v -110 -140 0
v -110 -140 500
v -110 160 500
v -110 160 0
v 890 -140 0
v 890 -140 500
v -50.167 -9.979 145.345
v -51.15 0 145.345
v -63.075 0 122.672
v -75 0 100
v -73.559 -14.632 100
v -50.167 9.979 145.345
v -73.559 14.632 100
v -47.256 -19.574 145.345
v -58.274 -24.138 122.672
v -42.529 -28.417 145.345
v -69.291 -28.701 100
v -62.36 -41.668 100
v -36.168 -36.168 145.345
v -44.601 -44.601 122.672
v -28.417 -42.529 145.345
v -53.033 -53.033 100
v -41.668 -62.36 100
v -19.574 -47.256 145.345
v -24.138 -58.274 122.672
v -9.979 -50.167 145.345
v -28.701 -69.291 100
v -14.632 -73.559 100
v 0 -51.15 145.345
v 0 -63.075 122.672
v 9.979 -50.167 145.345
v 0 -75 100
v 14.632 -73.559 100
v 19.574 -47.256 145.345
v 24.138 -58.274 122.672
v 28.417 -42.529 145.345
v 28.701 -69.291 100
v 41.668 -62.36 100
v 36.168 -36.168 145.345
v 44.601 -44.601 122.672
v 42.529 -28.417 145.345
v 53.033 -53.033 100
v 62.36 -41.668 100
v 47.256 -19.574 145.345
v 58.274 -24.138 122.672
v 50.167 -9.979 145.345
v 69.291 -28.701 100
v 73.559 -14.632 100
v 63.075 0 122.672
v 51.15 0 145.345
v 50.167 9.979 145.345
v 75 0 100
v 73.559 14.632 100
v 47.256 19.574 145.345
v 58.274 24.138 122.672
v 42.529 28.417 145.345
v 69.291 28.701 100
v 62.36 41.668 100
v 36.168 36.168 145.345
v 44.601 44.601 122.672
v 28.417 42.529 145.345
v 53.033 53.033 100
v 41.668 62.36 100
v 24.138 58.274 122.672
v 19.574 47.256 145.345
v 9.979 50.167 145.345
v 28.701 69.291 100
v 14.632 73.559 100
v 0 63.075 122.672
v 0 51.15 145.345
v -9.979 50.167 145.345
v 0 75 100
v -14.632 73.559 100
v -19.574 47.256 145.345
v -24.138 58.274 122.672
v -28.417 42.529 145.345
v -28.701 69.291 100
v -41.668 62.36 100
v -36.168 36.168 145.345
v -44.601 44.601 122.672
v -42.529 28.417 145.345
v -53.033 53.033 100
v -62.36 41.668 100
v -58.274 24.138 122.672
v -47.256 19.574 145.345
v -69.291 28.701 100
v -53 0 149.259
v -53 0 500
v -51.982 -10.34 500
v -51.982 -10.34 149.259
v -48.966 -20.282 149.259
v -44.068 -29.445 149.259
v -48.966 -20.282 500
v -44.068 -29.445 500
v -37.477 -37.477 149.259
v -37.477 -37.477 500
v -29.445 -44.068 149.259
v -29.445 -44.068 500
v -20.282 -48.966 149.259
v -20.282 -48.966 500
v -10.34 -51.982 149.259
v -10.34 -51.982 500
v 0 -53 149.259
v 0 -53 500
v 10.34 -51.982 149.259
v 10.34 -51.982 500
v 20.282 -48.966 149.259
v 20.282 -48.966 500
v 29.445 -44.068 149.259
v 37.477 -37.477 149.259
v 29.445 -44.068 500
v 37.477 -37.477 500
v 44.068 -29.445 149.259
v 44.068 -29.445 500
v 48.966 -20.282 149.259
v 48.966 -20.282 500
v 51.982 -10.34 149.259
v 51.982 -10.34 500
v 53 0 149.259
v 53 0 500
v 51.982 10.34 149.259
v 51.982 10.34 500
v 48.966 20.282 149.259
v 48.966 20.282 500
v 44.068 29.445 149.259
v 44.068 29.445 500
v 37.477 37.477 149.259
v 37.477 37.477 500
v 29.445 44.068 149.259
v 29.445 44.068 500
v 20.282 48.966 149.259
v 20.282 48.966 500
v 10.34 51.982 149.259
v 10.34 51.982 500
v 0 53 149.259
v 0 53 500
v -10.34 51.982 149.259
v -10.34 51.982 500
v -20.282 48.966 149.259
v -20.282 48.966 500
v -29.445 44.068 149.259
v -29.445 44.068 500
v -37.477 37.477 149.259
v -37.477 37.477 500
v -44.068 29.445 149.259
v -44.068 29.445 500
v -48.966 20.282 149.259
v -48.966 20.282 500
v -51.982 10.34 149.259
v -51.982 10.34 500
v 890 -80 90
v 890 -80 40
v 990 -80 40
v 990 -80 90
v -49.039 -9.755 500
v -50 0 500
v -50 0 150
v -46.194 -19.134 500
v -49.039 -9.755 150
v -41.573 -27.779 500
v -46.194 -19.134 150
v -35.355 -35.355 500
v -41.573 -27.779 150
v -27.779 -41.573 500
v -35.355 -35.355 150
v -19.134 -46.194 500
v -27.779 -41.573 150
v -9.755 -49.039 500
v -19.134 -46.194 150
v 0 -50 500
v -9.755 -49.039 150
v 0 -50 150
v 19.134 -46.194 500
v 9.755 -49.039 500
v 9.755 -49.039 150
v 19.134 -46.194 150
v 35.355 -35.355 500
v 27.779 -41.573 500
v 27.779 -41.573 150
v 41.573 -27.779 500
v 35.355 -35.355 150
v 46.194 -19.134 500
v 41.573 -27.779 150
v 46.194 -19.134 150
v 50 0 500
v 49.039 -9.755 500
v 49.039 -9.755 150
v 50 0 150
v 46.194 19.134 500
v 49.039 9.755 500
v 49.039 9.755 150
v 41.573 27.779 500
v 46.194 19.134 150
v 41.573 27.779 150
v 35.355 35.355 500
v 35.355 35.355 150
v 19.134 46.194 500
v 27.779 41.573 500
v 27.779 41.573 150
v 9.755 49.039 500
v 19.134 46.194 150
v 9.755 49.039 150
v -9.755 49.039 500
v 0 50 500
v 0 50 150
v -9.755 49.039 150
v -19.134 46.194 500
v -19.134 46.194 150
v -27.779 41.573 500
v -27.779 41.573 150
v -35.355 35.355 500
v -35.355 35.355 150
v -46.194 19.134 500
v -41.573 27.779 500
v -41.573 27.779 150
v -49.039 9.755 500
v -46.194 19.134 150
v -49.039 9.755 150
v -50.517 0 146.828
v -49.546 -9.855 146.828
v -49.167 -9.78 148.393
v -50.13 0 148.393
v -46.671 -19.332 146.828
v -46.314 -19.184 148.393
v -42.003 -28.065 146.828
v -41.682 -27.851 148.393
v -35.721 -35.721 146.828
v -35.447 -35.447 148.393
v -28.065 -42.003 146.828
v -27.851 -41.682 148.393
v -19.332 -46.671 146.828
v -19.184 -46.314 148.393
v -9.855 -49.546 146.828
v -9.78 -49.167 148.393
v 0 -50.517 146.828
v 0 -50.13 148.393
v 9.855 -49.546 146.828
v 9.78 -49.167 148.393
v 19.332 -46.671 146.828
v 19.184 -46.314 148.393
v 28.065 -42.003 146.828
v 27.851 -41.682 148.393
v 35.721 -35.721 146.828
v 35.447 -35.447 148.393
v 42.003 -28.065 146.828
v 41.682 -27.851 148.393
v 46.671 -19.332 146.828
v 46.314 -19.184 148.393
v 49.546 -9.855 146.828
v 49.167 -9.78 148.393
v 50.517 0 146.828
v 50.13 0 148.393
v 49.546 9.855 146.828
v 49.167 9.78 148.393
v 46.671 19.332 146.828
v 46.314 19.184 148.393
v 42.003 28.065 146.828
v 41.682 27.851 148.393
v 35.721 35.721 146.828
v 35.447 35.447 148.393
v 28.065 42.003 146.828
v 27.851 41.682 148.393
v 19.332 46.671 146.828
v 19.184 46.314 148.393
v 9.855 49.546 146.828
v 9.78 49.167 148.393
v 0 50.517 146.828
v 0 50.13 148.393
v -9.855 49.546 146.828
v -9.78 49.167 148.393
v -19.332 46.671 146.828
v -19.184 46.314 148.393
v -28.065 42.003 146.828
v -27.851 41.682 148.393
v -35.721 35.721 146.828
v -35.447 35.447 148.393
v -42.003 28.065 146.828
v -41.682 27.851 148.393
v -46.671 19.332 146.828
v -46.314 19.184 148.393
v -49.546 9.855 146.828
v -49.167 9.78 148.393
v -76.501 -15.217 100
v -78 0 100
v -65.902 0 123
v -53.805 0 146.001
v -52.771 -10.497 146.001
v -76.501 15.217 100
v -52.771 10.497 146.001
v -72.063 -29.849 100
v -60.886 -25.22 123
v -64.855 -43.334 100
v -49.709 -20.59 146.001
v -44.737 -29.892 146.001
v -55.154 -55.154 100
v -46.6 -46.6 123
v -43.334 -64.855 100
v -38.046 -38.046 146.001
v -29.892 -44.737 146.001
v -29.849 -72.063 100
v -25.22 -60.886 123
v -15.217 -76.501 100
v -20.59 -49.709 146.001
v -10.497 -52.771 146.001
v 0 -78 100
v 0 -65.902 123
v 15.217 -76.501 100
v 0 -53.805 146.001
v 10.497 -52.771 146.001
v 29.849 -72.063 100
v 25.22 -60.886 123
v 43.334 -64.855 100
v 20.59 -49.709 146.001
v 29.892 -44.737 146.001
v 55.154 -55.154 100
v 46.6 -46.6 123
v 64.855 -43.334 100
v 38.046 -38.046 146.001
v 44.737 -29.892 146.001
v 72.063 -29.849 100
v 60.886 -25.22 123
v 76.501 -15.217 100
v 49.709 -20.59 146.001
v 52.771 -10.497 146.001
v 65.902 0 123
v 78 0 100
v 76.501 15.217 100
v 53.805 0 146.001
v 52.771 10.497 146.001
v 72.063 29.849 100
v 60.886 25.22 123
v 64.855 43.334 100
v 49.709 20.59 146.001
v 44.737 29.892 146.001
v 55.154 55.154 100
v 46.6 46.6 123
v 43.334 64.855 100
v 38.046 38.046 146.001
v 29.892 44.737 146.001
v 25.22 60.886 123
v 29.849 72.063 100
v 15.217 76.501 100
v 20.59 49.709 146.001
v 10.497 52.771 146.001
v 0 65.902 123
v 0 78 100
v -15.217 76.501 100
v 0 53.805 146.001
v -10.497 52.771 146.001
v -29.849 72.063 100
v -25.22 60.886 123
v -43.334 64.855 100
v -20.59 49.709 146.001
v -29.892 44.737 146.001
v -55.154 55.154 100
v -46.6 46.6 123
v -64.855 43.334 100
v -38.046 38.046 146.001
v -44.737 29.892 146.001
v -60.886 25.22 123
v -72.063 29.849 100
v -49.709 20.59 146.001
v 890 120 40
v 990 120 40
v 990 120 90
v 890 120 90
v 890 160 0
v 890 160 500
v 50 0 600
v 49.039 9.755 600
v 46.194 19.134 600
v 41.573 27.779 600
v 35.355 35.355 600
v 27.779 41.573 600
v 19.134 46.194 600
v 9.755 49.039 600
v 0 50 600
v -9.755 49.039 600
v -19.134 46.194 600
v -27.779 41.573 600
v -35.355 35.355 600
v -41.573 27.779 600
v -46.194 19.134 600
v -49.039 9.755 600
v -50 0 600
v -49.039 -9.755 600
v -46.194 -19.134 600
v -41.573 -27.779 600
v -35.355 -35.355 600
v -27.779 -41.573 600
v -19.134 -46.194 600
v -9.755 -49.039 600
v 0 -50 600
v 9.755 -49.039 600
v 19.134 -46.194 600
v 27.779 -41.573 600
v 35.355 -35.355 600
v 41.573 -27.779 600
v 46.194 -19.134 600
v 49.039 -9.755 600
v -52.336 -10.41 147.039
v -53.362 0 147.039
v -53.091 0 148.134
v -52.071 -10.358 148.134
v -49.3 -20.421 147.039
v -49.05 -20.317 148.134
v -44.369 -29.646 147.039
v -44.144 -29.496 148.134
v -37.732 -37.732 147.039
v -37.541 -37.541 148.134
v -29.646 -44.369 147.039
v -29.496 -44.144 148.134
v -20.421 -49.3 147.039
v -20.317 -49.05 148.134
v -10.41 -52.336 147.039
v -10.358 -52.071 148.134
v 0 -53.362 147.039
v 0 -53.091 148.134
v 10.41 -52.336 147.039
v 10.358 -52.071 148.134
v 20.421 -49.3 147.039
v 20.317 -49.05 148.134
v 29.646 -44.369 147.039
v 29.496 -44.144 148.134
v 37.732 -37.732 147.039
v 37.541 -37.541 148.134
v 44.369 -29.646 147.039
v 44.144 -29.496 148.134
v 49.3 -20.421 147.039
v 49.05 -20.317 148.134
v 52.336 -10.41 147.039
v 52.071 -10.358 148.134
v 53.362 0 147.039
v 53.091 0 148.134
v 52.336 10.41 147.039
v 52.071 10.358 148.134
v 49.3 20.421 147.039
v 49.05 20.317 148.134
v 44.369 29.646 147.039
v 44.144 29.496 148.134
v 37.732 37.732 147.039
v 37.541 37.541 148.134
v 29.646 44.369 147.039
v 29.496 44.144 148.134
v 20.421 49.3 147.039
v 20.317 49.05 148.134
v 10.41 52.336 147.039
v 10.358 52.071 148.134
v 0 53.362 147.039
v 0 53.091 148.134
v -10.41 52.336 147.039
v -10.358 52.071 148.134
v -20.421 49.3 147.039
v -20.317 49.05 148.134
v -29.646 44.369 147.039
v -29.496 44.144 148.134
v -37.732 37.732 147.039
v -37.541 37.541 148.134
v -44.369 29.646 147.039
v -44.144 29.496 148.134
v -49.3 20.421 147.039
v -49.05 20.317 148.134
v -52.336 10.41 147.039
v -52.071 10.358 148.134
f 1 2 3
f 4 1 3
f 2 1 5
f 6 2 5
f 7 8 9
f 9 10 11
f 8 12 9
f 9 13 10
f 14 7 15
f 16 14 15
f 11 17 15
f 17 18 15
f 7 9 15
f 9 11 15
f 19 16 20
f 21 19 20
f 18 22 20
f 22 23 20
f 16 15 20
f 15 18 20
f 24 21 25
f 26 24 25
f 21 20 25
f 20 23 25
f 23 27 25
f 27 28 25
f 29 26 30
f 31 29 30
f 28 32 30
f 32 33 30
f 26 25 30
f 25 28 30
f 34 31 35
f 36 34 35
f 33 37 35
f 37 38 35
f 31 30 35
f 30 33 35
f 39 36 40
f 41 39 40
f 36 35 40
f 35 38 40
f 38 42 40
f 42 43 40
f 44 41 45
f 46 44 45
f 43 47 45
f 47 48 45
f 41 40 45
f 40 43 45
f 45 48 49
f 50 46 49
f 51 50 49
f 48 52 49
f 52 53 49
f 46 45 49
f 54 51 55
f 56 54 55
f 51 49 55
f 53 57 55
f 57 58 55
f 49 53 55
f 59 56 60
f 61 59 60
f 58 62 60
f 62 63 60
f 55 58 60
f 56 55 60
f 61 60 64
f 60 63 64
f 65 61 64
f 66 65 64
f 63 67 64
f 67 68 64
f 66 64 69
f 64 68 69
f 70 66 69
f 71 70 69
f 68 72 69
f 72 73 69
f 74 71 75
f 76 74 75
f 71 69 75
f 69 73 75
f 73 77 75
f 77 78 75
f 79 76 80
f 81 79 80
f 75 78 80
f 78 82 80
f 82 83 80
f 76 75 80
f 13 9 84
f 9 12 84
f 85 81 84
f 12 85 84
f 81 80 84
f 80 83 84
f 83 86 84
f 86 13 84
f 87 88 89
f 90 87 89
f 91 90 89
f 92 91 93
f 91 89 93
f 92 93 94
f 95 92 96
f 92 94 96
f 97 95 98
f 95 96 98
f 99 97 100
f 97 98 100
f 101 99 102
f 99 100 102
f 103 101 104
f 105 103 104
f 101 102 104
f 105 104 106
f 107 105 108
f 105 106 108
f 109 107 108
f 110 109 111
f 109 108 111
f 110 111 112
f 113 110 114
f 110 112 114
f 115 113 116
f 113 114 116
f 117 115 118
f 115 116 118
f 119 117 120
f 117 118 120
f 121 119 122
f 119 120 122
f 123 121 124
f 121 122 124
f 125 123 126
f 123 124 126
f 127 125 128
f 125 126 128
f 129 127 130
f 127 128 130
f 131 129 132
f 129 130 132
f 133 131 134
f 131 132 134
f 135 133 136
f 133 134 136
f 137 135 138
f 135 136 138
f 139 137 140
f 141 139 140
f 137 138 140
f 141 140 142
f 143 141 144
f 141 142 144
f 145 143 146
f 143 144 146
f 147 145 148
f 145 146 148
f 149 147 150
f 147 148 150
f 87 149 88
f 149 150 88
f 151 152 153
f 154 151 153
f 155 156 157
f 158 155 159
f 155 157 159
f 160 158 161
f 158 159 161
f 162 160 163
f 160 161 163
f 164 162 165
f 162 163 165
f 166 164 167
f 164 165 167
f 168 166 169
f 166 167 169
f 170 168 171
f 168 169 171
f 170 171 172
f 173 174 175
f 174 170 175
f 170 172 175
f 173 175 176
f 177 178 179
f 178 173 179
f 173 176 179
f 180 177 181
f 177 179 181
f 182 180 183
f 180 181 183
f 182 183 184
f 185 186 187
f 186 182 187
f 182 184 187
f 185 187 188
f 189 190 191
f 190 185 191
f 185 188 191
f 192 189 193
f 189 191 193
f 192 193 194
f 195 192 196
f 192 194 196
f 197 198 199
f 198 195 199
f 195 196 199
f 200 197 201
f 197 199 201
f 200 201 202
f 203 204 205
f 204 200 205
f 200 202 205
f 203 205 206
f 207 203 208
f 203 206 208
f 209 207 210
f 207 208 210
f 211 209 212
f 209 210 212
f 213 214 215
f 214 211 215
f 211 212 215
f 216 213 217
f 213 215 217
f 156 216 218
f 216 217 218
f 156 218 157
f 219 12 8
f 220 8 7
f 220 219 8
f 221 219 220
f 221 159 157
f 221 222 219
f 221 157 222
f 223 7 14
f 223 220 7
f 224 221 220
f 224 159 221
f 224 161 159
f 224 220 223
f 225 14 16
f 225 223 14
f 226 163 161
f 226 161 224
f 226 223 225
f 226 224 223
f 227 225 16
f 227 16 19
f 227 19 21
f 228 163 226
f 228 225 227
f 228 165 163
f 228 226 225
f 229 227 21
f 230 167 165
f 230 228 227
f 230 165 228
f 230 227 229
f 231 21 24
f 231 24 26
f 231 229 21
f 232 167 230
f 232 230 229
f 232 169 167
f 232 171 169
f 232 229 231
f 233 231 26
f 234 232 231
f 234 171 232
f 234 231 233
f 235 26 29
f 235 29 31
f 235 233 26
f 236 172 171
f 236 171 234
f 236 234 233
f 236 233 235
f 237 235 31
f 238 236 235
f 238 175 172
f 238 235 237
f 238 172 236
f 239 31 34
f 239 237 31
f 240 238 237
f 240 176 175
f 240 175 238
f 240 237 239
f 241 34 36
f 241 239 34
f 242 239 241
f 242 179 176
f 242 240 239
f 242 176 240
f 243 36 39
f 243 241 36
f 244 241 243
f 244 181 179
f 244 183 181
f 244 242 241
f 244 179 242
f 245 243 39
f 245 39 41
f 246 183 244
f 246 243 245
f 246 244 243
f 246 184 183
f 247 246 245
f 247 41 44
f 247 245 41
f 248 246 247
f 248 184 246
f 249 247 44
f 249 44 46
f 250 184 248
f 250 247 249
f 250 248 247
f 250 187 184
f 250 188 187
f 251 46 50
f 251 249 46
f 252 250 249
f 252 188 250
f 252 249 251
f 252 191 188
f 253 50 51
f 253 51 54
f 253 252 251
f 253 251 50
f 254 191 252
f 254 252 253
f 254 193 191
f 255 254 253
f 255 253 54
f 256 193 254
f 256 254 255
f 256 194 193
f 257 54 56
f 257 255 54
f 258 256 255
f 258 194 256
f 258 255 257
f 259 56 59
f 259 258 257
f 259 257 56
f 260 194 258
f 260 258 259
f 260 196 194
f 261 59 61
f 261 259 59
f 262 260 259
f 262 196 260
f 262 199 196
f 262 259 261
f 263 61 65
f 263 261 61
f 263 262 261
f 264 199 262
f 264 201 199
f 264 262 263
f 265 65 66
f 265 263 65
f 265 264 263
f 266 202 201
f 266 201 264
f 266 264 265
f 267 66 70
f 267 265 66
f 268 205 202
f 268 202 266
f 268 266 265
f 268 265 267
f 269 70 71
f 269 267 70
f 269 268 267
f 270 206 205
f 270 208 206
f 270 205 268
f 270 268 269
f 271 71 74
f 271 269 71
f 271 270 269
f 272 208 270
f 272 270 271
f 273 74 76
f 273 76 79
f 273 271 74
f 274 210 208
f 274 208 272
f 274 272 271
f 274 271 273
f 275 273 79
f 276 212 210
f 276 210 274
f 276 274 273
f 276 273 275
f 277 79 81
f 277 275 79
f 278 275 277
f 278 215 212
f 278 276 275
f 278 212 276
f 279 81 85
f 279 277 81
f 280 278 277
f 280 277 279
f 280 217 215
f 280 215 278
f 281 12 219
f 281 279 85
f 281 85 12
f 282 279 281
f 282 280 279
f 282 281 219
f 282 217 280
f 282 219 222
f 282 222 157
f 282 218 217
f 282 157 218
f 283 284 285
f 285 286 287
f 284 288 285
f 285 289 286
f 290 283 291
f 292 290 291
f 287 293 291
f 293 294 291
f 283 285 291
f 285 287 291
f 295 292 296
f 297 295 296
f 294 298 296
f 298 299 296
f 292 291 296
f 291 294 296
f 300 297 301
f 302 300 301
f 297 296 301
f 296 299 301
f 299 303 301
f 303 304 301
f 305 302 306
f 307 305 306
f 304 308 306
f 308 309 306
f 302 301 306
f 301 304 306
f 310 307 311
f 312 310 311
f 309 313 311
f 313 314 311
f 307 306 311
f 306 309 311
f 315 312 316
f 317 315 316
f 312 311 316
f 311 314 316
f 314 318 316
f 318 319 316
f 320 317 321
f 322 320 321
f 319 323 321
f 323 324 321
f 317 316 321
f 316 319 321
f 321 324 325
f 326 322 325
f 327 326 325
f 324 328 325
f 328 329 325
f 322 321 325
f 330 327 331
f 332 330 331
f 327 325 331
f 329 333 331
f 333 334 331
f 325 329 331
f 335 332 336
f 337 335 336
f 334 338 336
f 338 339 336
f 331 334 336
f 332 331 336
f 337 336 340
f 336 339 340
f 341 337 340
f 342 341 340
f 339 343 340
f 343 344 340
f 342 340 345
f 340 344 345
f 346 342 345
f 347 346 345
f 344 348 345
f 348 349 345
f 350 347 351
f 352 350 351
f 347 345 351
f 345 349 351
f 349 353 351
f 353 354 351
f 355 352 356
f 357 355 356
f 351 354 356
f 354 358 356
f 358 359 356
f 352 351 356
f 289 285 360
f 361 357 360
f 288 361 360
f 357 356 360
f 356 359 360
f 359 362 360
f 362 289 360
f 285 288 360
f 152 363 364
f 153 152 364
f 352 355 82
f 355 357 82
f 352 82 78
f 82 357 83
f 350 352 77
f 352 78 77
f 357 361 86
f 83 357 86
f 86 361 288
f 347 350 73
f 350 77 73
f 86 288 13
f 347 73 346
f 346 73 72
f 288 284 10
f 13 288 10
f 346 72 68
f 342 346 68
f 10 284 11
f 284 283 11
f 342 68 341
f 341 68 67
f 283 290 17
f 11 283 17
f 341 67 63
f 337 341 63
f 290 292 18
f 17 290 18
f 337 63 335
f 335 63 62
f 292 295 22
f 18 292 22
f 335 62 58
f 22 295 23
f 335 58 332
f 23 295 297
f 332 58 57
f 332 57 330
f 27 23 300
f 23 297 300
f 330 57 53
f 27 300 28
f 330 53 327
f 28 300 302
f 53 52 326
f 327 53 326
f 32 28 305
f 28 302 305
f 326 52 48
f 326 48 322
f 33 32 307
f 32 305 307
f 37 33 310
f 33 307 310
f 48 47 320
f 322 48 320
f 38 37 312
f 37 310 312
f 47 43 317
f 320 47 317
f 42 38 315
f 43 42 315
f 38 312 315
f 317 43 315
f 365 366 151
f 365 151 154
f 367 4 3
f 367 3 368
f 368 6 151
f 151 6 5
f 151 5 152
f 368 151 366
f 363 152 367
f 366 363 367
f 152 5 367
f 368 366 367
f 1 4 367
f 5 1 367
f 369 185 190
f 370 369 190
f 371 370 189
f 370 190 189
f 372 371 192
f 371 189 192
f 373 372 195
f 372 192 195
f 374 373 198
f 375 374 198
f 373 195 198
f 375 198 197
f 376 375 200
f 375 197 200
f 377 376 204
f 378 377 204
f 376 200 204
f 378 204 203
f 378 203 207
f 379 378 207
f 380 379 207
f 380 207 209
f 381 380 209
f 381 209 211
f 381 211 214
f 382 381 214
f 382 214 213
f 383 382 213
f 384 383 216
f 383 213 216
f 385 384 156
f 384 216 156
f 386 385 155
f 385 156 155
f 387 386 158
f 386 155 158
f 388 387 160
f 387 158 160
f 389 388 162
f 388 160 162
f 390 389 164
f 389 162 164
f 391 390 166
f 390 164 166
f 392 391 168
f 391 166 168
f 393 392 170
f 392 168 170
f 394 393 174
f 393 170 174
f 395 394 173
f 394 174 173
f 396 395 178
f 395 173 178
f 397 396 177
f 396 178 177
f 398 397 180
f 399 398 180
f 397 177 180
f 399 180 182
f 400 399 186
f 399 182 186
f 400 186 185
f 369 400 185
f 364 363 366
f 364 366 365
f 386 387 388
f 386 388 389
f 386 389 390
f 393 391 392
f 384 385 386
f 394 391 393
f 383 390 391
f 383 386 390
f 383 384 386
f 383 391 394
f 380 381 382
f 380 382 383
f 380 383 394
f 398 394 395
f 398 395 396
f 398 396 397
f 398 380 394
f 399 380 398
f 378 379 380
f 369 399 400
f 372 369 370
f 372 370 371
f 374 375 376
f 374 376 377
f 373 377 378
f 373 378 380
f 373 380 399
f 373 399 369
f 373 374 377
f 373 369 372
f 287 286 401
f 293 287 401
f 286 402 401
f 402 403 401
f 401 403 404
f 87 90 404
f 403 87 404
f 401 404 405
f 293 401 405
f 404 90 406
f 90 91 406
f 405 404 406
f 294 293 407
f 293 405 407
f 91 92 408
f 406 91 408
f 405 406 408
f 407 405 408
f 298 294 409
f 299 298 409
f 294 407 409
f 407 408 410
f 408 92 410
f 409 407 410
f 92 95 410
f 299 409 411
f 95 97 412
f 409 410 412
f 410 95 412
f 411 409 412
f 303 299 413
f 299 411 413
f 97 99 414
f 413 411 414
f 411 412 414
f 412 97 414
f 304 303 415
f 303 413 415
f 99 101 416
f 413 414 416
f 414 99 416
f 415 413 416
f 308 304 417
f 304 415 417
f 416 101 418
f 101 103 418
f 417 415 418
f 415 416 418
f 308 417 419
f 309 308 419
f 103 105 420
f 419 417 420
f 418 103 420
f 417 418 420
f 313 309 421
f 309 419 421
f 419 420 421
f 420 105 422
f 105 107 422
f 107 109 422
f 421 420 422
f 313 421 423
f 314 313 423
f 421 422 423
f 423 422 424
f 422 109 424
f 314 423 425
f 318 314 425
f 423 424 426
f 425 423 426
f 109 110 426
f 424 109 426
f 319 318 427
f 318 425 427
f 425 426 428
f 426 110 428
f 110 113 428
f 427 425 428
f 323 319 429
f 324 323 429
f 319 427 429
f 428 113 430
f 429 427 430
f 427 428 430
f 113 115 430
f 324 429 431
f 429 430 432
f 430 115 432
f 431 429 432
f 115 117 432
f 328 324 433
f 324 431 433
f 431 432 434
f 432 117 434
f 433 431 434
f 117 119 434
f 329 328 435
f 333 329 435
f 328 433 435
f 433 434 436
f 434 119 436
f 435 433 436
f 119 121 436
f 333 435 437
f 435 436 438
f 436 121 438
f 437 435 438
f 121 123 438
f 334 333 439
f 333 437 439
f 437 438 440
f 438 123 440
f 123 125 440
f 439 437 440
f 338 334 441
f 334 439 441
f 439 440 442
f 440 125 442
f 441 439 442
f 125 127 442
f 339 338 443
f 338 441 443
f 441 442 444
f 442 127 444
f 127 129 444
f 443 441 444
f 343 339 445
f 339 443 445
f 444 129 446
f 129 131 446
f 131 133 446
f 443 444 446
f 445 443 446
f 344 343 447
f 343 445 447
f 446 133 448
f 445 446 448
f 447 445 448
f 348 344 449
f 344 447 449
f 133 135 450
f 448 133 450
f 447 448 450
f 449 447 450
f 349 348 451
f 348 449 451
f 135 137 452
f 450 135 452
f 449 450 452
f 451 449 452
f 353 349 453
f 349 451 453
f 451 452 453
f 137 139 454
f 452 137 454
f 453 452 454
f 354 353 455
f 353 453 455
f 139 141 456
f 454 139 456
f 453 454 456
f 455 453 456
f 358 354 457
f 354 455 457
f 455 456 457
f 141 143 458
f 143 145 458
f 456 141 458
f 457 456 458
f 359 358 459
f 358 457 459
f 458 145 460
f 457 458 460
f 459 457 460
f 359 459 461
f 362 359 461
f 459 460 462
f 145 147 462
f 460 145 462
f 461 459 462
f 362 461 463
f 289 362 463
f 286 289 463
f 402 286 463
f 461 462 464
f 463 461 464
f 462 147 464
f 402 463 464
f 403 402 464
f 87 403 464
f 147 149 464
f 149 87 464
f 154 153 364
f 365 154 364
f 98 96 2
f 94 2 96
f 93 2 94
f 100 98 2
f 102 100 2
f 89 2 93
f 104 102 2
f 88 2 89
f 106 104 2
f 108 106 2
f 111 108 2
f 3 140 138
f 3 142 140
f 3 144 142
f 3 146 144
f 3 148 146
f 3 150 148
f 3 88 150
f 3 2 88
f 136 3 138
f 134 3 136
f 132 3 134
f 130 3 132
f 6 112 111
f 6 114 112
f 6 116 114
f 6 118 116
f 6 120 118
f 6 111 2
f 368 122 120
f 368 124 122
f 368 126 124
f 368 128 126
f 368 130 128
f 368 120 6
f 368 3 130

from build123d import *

# Parameters (mm, degrees)
BOX001_W     = 100
BOX001_H     = 200
BOX001_DEPTH = 50
BOX_W        = 1000
BOX_H        = 300
BOX_DEPTH    = 500
SKETCH001_R  = 50
PAD_DEPTH    = 100


with BuildPart() as box001:
    # Box001 → Box001 (new body)
    with BuildSketch(Plane(origin=(890, -80, 40), x_dir=(1, 0, 0), z_dir=(0, 0, 1))):
        with Locations((50, 100)):
            Rectangle(BOX001_W, BOX001_H)
    extrude(amount=BOX001_DEPTH)


with BuildPart() as body:
    # Sketch → Revolution (revolve)
    with BuildSketch(Plane.XZ):
        with BuildLine():
            Line((-50, 649.259148), (-50, 150))
            ThreePointArc((-51.149586, 145.344876), (-50.29165, 147.602515), (-50, 150))
            Line((-51.149586, 145.344876), (-75, 100))
            Line((-75, 100), (-78, 100))
            Line((-78, 100), (-53.804711, 146.000561))
            ThreePointArc((-53.804711, 146.000561), (-53.204155, 147.580909), (-53, 149.259148))
            Line((-53, 149.259148), (-53, 649.259148))
            Line((-53, 649.259148), (-50, 649.259148))
        make_face()
    revolve(axis=Axis((0, 0, 0), (0, 0, 1)))


with BuildPart() as fusion:
    # Box → Box (new body)
    with BuildSketch(Plane(origin=(-110, -140, 0), x_dir=(1, 0, 0), z_dir=(0, 0, 1))):
        with Locations((500, 150)):
            Rectangle(BOX_W, BOX_H)
    extrude(amount=BOX_DEPTH)

    # Cut: cut Body
    add(body.part, mode=Mode.SUBTRACT)

    # Sketch001 (on Face14 of BaseFeature) → Pad (new body)
    with BuildSketch(Plane.XY.offset(500)):
        Circle(SKETCH001_R)
    extrude(amount=PAD_DEPTH)

    # Fusion: union Box001
    add(box001.part)


solid = fusion.part
